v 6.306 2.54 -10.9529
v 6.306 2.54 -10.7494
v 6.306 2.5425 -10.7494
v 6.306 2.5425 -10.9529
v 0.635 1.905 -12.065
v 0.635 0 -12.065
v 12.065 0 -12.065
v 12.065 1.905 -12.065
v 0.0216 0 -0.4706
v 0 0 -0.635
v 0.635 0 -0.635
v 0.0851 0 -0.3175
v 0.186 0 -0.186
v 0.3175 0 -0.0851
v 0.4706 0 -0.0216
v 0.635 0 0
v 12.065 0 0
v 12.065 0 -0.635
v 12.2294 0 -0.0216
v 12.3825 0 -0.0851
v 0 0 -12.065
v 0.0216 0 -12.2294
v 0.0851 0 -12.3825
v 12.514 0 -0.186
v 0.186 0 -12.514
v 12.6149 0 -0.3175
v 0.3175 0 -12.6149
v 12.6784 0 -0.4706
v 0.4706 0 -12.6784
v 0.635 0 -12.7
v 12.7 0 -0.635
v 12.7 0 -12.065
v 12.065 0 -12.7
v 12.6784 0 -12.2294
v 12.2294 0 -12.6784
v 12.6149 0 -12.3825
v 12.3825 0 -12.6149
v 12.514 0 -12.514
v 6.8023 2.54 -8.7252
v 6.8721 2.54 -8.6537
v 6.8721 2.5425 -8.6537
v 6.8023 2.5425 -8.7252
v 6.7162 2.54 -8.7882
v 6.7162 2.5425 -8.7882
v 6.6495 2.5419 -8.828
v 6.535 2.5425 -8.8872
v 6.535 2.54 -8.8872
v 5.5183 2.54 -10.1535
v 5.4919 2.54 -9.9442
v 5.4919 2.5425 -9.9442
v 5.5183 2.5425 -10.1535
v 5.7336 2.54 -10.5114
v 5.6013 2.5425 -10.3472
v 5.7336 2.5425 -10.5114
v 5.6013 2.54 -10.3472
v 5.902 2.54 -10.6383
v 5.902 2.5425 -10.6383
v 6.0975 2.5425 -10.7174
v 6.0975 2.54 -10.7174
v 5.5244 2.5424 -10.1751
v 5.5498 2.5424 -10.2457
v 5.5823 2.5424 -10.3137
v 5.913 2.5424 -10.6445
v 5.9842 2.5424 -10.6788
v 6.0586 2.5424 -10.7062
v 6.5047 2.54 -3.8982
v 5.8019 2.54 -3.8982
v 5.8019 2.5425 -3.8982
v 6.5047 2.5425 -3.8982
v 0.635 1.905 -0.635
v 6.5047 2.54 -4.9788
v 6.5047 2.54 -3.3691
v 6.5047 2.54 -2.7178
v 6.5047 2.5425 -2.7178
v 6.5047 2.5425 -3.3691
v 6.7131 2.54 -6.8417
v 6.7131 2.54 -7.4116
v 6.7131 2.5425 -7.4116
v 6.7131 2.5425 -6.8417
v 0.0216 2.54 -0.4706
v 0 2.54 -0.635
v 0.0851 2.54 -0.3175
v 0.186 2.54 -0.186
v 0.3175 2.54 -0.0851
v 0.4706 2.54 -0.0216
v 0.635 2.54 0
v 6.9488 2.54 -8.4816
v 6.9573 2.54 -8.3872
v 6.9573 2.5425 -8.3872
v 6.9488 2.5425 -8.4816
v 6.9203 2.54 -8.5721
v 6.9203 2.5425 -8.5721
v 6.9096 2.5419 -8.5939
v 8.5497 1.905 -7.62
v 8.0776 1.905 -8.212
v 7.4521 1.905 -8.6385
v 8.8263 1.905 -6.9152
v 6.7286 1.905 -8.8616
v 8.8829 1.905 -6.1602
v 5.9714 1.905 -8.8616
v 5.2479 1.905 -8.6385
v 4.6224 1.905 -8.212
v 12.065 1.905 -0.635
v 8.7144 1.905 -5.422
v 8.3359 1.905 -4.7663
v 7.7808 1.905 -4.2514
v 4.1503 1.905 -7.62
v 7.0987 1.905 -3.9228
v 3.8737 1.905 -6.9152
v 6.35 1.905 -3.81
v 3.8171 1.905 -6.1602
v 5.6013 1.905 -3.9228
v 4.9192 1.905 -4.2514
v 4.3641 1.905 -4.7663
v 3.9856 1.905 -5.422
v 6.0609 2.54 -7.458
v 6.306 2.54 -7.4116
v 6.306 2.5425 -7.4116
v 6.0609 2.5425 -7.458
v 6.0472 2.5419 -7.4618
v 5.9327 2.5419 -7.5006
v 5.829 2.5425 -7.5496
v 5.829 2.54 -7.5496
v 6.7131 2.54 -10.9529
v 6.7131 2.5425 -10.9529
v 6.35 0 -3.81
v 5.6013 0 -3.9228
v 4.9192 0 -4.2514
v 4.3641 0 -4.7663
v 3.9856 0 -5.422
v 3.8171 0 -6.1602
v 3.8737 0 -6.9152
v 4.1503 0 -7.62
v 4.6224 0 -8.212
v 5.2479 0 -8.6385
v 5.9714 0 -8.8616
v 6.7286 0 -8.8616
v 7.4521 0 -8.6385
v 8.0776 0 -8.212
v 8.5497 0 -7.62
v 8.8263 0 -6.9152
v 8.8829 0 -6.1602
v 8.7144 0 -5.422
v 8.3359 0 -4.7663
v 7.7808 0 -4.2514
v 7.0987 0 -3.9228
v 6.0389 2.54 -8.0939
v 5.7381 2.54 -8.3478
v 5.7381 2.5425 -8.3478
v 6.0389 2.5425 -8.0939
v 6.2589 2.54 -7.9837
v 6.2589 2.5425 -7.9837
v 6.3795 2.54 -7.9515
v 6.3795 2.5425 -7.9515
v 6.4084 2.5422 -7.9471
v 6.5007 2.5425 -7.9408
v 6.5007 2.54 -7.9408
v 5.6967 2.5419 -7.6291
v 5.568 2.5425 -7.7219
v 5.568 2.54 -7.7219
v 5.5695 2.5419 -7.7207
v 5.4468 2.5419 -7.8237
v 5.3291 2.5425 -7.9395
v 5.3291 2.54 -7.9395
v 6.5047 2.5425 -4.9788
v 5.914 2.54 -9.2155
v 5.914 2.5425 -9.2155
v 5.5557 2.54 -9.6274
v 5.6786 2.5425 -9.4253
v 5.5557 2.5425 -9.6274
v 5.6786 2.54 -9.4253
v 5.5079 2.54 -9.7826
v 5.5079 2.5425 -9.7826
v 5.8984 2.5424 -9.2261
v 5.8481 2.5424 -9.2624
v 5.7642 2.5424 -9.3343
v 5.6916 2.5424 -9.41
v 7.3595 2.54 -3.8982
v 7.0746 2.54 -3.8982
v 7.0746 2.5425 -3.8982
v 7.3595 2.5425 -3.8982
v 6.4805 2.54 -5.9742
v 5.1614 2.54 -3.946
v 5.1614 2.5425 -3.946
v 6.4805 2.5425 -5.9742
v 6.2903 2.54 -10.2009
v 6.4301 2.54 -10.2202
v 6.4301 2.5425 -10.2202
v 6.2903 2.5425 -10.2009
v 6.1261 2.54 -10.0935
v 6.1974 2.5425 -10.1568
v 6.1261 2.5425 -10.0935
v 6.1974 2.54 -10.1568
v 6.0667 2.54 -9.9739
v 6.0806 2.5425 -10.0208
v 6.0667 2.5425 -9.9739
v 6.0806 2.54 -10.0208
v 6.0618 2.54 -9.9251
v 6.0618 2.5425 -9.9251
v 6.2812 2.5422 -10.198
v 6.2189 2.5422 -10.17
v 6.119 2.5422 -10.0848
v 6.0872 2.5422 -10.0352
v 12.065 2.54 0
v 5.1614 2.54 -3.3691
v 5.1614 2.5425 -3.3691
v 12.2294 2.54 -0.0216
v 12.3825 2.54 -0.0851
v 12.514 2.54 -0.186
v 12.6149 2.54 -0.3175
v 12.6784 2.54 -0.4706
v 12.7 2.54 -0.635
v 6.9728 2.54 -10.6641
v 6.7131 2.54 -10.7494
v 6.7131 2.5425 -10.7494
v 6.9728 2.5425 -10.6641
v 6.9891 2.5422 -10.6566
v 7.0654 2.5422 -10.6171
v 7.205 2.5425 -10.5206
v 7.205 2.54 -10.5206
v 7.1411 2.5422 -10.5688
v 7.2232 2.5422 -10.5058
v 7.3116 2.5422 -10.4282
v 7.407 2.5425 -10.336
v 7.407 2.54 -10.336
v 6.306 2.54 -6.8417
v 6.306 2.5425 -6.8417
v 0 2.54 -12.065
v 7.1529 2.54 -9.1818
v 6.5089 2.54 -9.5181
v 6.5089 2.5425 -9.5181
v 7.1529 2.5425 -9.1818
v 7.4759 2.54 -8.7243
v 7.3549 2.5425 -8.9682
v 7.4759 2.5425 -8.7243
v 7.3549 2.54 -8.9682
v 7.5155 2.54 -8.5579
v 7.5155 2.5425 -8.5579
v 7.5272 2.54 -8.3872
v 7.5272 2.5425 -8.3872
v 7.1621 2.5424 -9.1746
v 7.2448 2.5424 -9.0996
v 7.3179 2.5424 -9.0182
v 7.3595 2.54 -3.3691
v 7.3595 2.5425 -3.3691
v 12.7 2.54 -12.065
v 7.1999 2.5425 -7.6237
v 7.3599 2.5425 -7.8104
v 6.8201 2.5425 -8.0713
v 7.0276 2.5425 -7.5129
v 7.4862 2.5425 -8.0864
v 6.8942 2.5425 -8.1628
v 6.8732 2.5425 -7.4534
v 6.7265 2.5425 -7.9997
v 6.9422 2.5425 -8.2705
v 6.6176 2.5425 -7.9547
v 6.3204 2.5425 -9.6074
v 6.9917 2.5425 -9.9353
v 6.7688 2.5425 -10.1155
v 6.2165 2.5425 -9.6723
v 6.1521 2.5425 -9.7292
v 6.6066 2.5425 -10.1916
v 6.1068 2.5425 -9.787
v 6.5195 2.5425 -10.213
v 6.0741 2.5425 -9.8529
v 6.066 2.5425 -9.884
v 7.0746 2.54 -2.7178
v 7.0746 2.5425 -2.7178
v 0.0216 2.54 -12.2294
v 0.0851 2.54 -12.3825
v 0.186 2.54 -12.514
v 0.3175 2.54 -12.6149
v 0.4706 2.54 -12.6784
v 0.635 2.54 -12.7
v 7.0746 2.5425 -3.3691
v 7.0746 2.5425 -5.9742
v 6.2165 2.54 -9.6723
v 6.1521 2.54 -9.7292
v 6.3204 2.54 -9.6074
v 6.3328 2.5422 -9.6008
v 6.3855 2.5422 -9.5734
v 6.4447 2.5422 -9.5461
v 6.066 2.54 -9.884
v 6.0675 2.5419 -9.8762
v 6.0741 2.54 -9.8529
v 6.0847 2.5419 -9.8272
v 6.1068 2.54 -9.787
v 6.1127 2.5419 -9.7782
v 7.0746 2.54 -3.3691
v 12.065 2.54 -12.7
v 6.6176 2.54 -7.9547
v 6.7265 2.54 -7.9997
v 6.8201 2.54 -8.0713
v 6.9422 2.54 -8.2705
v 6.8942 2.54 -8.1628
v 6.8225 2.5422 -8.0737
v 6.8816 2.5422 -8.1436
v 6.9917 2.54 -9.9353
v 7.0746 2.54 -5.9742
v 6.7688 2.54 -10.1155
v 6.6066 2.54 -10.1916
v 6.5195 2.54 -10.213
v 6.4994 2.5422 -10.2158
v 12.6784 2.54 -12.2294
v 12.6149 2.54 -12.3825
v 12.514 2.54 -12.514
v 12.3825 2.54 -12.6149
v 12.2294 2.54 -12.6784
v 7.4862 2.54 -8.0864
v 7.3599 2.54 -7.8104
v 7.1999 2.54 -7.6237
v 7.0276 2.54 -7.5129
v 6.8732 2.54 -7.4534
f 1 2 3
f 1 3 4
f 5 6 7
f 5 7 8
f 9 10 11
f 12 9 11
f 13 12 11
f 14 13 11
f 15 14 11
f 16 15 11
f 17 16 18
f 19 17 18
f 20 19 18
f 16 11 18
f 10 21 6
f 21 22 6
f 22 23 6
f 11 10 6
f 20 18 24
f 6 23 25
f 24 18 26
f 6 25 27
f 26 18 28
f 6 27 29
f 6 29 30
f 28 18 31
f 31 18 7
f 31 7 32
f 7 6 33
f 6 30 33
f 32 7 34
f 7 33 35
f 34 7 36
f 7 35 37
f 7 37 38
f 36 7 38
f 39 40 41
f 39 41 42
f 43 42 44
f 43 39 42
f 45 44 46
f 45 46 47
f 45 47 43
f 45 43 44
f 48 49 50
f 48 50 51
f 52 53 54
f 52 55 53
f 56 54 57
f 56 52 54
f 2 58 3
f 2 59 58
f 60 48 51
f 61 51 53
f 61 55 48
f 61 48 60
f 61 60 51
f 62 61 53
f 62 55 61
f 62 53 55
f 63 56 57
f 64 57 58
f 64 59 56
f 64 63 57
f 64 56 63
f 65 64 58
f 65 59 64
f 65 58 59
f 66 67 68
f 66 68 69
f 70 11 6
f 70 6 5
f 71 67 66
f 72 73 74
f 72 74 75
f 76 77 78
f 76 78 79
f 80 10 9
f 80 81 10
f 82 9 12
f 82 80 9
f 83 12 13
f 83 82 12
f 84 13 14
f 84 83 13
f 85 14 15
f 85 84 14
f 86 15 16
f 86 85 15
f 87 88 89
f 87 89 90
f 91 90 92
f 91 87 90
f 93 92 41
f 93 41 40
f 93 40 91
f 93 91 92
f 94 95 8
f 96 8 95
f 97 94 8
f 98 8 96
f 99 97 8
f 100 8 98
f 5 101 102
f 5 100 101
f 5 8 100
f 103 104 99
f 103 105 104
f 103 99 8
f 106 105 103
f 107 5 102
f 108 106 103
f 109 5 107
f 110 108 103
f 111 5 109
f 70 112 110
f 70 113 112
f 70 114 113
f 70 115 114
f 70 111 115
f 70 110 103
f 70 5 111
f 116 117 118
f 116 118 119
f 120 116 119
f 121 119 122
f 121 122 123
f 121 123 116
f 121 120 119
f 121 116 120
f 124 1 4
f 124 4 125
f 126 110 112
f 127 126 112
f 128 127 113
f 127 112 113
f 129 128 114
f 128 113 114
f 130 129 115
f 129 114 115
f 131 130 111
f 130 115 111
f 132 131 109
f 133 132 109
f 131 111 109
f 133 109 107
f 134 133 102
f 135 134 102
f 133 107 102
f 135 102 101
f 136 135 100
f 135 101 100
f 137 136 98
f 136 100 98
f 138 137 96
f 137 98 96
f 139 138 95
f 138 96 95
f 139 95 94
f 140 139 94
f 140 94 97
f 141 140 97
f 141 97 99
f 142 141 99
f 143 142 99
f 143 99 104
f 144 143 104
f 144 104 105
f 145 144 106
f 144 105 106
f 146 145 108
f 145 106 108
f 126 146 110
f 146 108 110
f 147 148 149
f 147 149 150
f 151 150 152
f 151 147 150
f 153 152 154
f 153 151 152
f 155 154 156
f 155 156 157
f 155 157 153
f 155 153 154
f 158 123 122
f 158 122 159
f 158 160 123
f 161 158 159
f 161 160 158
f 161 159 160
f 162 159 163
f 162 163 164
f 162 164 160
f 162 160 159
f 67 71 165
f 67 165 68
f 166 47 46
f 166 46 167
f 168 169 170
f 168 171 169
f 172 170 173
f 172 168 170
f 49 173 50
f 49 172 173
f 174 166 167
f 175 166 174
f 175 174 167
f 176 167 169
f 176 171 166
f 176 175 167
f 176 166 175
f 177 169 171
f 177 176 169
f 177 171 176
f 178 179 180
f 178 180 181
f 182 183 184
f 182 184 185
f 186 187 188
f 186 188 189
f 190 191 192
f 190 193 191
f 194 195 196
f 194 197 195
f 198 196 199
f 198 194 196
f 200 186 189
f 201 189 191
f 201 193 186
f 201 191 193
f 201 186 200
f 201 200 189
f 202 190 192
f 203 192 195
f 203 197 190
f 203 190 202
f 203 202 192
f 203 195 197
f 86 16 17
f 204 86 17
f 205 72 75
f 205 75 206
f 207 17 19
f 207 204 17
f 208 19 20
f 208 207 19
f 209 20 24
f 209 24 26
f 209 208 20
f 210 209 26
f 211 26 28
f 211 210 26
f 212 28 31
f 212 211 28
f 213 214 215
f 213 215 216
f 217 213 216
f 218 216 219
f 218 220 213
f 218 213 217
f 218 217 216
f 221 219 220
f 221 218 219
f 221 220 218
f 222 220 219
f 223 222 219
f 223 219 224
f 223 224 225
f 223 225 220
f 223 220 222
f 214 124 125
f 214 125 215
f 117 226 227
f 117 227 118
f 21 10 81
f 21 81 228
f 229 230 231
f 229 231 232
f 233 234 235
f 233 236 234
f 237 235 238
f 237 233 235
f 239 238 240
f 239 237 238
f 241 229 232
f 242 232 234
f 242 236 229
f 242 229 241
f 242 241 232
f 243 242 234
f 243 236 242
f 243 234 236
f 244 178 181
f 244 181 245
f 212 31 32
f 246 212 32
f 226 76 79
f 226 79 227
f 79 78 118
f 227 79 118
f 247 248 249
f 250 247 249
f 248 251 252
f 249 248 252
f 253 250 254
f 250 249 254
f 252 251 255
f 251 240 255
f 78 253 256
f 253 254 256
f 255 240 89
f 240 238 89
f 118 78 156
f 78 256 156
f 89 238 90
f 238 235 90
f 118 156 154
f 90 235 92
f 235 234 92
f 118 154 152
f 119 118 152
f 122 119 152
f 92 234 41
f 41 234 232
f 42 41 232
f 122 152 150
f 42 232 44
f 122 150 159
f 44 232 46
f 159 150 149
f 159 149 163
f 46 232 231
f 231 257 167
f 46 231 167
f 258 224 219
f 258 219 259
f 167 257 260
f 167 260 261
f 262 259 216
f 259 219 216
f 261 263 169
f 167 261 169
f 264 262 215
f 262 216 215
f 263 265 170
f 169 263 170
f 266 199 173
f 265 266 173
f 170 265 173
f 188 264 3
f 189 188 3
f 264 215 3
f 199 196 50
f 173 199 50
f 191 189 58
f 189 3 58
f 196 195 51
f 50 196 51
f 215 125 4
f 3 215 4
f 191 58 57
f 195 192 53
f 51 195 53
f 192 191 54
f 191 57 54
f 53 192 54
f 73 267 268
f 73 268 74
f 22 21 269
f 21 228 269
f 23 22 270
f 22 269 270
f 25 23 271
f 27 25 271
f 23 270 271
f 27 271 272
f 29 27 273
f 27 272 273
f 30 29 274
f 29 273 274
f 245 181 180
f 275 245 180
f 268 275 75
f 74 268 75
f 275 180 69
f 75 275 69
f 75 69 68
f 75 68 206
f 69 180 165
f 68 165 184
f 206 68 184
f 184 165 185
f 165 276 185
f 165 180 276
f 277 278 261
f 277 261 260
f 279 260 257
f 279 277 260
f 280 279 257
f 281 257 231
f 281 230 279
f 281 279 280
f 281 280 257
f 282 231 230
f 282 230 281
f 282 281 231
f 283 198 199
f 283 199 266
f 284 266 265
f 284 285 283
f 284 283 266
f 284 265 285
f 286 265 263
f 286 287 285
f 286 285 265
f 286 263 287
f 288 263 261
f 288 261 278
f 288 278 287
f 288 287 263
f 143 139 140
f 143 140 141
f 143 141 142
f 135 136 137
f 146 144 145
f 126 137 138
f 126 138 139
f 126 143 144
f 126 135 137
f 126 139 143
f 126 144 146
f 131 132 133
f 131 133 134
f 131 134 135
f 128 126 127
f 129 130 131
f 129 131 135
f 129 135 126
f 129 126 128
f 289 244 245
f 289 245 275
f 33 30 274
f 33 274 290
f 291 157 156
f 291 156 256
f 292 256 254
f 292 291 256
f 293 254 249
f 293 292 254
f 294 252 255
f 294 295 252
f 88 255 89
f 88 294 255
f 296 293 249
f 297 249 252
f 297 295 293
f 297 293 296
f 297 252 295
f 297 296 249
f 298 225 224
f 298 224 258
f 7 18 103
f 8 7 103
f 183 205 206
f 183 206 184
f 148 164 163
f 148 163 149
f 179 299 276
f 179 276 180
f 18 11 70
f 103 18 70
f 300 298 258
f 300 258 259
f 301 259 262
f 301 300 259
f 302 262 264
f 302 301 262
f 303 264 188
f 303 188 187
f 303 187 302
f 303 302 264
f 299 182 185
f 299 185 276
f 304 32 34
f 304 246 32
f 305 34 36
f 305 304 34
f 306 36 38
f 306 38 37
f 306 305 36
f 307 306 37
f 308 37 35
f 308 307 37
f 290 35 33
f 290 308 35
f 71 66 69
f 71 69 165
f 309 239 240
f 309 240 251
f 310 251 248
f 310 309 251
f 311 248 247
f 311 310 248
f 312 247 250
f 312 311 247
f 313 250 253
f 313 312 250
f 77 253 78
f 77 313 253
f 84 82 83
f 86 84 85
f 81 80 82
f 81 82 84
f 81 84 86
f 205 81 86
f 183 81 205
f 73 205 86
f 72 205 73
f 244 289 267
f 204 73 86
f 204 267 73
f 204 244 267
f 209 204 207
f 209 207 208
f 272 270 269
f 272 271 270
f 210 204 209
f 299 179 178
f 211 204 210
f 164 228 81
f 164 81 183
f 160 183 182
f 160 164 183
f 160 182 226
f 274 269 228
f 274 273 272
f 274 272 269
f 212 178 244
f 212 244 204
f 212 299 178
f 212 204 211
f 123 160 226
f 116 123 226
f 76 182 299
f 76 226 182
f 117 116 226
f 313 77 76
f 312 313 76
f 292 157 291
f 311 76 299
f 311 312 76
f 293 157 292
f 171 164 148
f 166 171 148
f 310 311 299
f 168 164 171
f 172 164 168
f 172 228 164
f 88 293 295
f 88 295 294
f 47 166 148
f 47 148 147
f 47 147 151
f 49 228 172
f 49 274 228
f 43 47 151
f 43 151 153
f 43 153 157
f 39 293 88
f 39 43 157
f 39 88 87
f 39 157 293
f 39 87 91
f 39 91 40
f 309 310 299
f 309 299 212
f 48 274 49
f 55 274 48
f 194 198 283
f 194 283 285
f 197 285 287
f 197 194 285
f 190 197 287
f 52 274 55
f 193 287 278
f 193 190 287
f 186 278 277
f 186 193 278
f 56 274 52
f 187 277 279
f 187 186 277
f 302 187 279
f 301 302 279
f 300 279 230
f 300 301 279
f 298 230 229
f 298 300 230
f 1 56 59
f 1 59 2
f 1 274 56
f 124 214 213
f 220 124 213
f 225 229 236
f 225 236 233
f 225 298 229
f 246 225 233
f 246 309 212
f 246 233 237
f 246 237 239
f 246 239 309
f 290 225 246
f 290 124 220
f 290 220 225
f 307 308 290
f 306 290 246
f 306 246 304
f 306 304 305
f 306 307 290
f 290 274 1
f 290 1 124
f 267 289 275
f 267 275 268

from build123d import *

# Parameters (mm, degrees)
SKETCH1_W           = 12.7
SKETCH1_H           = 12.7
BOSS_EXTRUDE1_DEPTH = 2.54
FILLET1_R           = 0.635
SHELL1_START        = 0.635
SHELL1_OUTLINE_W    = 1.905
SHELL1_OUTLINE_H    = 11.43
SHELL1_DEPTH        = 11.43
SKETCH2_R           = 2.54
BOSS_EXTRUDE2_DEPTH = 1.905
BOSS_EXTRUDE4_DEPTH = 0.00254


# Read off the part's stored shape, not the designer's step: Shell1
with BuildPart() as part:
    # Sketch1 → Boss-Extrude1 (new body)
    with BuildSketch(Plane(origin=(0, 0, 0), x_dir=(1, 0, 0), z_dir=(0, 1, 0))):
        with Locations((6.35, 6.35)):
            Rectangle(SKETCH1_W, SKETCH1_H)
    extrude(amount=BOSS_EXTRUDE1_DEPTH)

    # Fillet1
    fillet1_edges = [part.edges().sort_by_distance(p)[0] for p in [
        (0, 1.27, -12.7),
        (12.7, 1.27, -12.7),
        (12.7, 1.27, 0),
        (0, 1.27, 0),
    ]]
    fillet(fillet1_edges, radius=FILLET1_R)

    # Shell1 outline → Shell1 (cut)
    with BuildSketch(Plane.YZ.offset(SHELL1_START)):
        with Locations((0.9525, -6.35)):
            Rectangle(SHELL1_OUTLINE_W, SHELL1_OUTLINE_H)
    extrude(amount=SHELL1_DEPTH, mode=Mode.SUBTRACT)

    # Sketch2 → Boss-Extrude2 (add)
    with BuildSketch(Plane(origin=(0, 1.905, 0), x_dir=(-1, 0, 0), z_dir=(0, -1, 0))):
        with Locations(Location((-6.35, 6.35, 0), (0, 0, 270))):
            Circle(SKETCH2_R)
    extrude(amount=BOSS_EXTRUDE2_DEPTH)

    # Sketch4 → Boss-Extrude4 (add)
    # profile 1 of 2: a face of its own
    with BuildSketch(Plane(origin=(0, 2.54, 0), x_dir=(1, 0, 0), z_dir=(0, 1, 0))):
        Polygon((6.480510817, 5.974210256), (7.074551282, 5.974210256), (7.074551282, 3.898248718), (7.359487179, 3.898248718), (7.359487179, 3.369082051), (7.074551282, 3.369082051), (7.074551282, 2.7178), (6.504679487, 2.7178), (6.504679487, 3.369082051), (5.161410256, 3.369082051), (5.161410256, 3.94595004), align=None)
        Polygon((6.504679487, 3.898248718), (6.504679487, 4.978842668), (5.801880008, 3.898248718), align=None, mode=Mode.SUBTRACT)
    # profile 2 of 2: a face of its own
    with BuildSketch(Plane(origin=(0, 2.54, 0), x_dir=(1, 0, 0), z_dir=(0, 1, 0))):
        with BuildLine():
            Line((7.406984976, 10.335998798), (6.991665465, 9.935307692))
            add(Edge.make_bspline(
                [(6.991665465, 9.935307692), (6.968220024, 9.957896469), (6.922854486, 10.001604413), (6.851968783, 10.059827369), (6.781357064, 10.108976166), (6.711092446, 10.149588351), (6.640799627, 10.181124743), (6.570421611, 10.203546558), (6.500157891, 10.217583932), (6.453231922, 10.219364448), (6.430061899, 10.22024359)],
                knots=[0, 0, 0, 0, 1.208861562, 2.33907556, 3.402820298, 4.400980881, 5.349191832, 6.258141005, 7.139945025, 8, 8, 8, 8], degree=3))
            add(Edge.make_bspline(
                [(6.430061899, 10.22024359), (6.403899471, 10.219170975), (6.353552661, 10.217106842), (6.281800477, 10.200625662), (6.218083395, 10.171963441), (6.162978001, 10.1335672), (6.118660061, 10.08737089), (6.085670238, 10.036873816), (6.065418702, 9.982146492), (6.063012994, 9.944162193), (6.061807692, 9.92513141)],
                knots=[0, 0, 0, 0, 1.198011544, 2.305445805, 3.348962256, 4.381113563, 5.363569282, 6.263566672, 7.130017225, 8, 8, 8, 8], degree=3))
            add(Edge.make_bspline(
                [(6.061807692, 9.92513141), (6.062942346, 9.908653977), (6.065271259, 9.874833543), (6.08412075, 9.82517461), (6.11232136, 9.775299071), (6.138383978, 9.745137076), (6.152122196, 9.729237981)],
                knots=[0, 0, 0, 0, 0.894516561, 1.836022459, 2.859316659, 4, 4, 4, 4], degree=3))
            add(Edge.make_bspline(
                [(6.152122196, 9.729237981), (6.160244287, 9.720816207), (6.177567552, 9.702853763), (6.208320254, 9.677594331), (6.244828496, 9.652473945), (6.286427709, 9.626009569), (6.334076496, 9.599858268), (6.386982478, 9.572031842), (6.4461068, 9.54521439), (6.487487603, 9.527340869), (6.508928085, 9.518080128)],
                knots=[0, 0, 0, 0, 0.672423156, 1.434182798, 2.28314655, 3.220082228, 4.268069212, 5.407712864, 6.656867891, 8, 8, 8, 8], degree=3))
            add(Edge.make_bspline(
                [(6.508928085, 9.518080128), (6.547123945, 9.501624615), (6.620529049, 9.470000279), (6.725949021, 9.423048644), (6.821745388, 9.377334714), (6.908362629, 9.333599875), (6.985371716, 9.291637921), (7.053234273, 9.251918102), (7.110960799, 9.212858211), (7.176358415, 9.165369813), (7.245332068, 9.101127918), (7.319697388, 9.019919388), (7.382052409, 8.929969443), (7.434496037, 8.833656469), (7.475970735, 8.730809102), (7.506000976, 8.621840061), (7.524224787, 8.506579255), (7.526188983, 8.42758935), (7.527192308, 8.387240785)],
                knots=[0, 0, 0, 0, 1.218452834, 2.341632252, 3.380669879, 4.327878116, 5.183951769, 5.949833714, 6.63028248, 7.225317665, 8.315786147, 9.384546881, 10.445973047, 11.51321668, 12.591625589, 13.68712373, 14.81856753, 16, 16, 16, 16], degree=3))
            add(Edge.make_bspline(
                [(7.527192308, 8.387240785), (7.525940527, 8.346682546), (7.523476092, 8.266833747), (7.504812176, 8.149311253), (7.472571433, 8.036846212), (7.429153295, 7.929917836), (7.374984908, 7.831254365), (7.31426383, 7.741649541), (7.245676289, 7.662999272), (7.181542739, 7.60682825), (7.126266053, 7.566022086), (7.079408572, 7.539362519), (7.029180829, 7.512893987), (6.974279808, 7.488884305), (6.915217227, 7.466725999), (6.851680833, 7.446436031), (6.784149797, 7.427141632), (6.737109705, 7.416846646), (6.713089744, 7.411589744)],
                knots=[0, 0, 0, 0, 1.398055402, 2.752413464, 4.089819795, 5.424146338, 6.722736095, 7.963569404, 9.149738937, 10.309787565, 10.896110825, 11.515406893, 12.166006826, 12.853269453, 13.579614796, 14.340134636, 15.152427224, 16, 16, 16, 16], degree=3))
            Line((6.713089744, 7.411589744), (6.713089744, 6.841717949))
            Line((6.713089744, 6.841717949), (6.306038462, 6.841717949))
            Line((6.306038462, 6.841717949), (6.306038462, 7.411589744))
            add(Edge.make_bspline(
                [(6.306038462, 7.411589744), (6.260932407, 7.417508865), (6.173627208, 7.428965643), (6.048973026, 7.459844727), (5.933431761, 7.497036363), (5.863209037, 7.532393856), (5.82902524, 7.549605569)],
                knots=[0, 0, 0, 0, 1.092056374, 2.113733945, 3.081782489, 4, 4, 4, 4], degree=3))
            add(Edge.make_bspline(
                [(5.82902524, 7.549605569), (5.784421922, 7.575319651), (5.694521215, 7.627147952), (5.567652028, 7.720202965), (5.443690251, 7.822749518), (5.367680431, 7.900192292), (5.329115385, 7.939484375)],
                knots=[0, 0, 0, 0, 0.970088211, 1.955271939, 2.962567826, 4, 4, 4, 4], degree=3))
            Line((5.329115385, 7.939484375), (5.73807472, 8.347807692))
            add(Edge.make_bspline(
                [(5.73807472, 8.347807692), (5.770276914, 8.315531916), (5.832553047, 8.253113482), (5.930208341, 8.170258717), (6.026937688, 8.099683859), (6.123133593, 8.042123916), (6.21841229, 7.996807875), (6.313137257, 7.964752249), (6.40716107, 7.944584507), (6.469824943, 7.942018876), (6.500659856, 7.94075641)],
                knots=[0, 0, 0, 0, 1.232518957, 2.38358023, 3.459285847, 4.467107529, 5.410929513, 6.306558082, 7.166710731, 8, 8, 8, 8], degree=3))
            add(Edge.make_bspline(
                [(6.500659856, 7.94075641), (6.530935033, 7.942287354), (6.590433781, 7.945296064), (6.676251693, 7.970961733), (6.754438188, 8.014226678), (6.824451013, 8.071818039), (6.882924302, 8.140474874), (6.926114925, 8.217254316), (6.952937787, 8.300259042), (6.955847074, 8.357998183), (6.957320513, 8.387240785)],
                knots=[0, 0, 0, 0, 1.025332292, 2.015049702, 3.006124463, 4.038216902, 5.073984904, 6.04617681, 7.010465453, 8, 8, 8, 8], degree=3))
            add(Edge.make_bspline(
                [(6.957320513, 8.387240785), (6.95646201, 8.411933563), (6.954785019, 8.460168152), (6.938095616, 8.529934505), (6.911632454, 8.595452748), (6.88533712, 8.634212047), (6.872094151, 8.653732171)],
                knots=[0, 0, 0, 0, 1.039339221, 2.030233321, 3.007977686, 4, 4, 4, 4], degree=3))
            add(Edge.make_bspline(
                [(6.872094151, 8.653732171), (6.85460202, 8.673362669), (6.816189839, 8.716470638), (6.740466296, 8.774265663), (6.645219094, 8.832335499), (6.573483267, 8.868013356), (6.535004808, 8.887150641)],
                knots=[0, 0, 0, 0, 0.762317005, 1.674024744, 2.752367564, 4, 4, 4, 4], degree=3))
            add(Edge.make_bspline(
                [(6.535004808, 8.887150641), (6.494507252, 8.906433078), (6.416597652, 8.943528822), (6.304602291, 8.997049085), (6.203256868, 9.048626278), (6.112557984, 9.097686427), (6.03159058, 9.142731993), (5.960729388, 9.184249859), (5.900795306, 9.224016823), (5.83450108, 9.27124253), (5.764387026, 9.331778858), (5.691098847, 9.407825341), (5.628662473, 9.487993783), (5.578981708, 9.573423124), (5.539805424, 9.661899474), (5.512543165, 9.753617062), (5.495251156, 9.847946671), (5.493048251, 9.91191248), (5.491935897, 9.944211939)],
                knots=[0, 0, 0, 0, 1.361149963, 2.618593809, 3.766618961, 4.811512794, 5.747589985, 6.578416214, 7.302870291, 7.929605856, 9.047509489, 10.107720061, 11.130736737, 12.122694611, 13.099282469, 14.059974503, 15.020386449, 16, 16, 16, 16], degree=3))
            add(Edge.make_bspline(
                [(5.491935897, 9.944211939), (5.492688489, 9.970752491), (5.494175897, 10.023206783), (5.505434517, 10.100481592), (5.522750824, 10.175049255), (5.548766759, 10.246263408), (5.581362042, 10.314610672), (5.620802687, 10.380506472), (5.6682686, 10.442870868), (5.722186861, 10.501770993), (5.78128424, 10.555933143), (5.844845686, 10.604219102), (5.912333412, 10.645653847), (5.983778264, 10.680011213), (6.058992906, 10.707624067), (6.137825565, 10.728257196), (6.220507462, 10.743532862), (6.277140501, 10.747424489), (6.306038462, 10.749410256)],
                knots=[0, 0, 0, 0, 1.004170626, 1.984625641, 2.949958411, 3.896703334, 4.847824684, 5.812490235, 6.7978582, 7.808834457, 8.831147227, 9.827755371, 10.825493475, 11.823199312, 12.823418834, 13.853042784, 14.904478961, 16, 16, 16, 16], degree=3))
            Line((6.306038462, 10.749410256), (6.306038462, 10.952935897))
            Line((6.306038462, 10.952935897), (6.713089744, 10.952935897))
            Line((6.713089744, 10.952935897), (6.713089744, 10.749410256))
            add(Edge.make_bspline(
                [(6.713089744, 10.749410256), (6.746474507, 10.740874198), (6.811234543, 10.724315883), (6.903809354, 10.69417972), (6.987944372, 10.65820288), (7.067293727, 10.617748164), (7.145681965, 10.56733025), (7.227556159, 10.503669804), (7.31605682, 10.425644759), (7.375483722, 10.367055847), (7.406984976, 10.335998798)],
                knots=[0, 0, 0, 0, 1.007023709, 1.953432773, 2.841901989, 3.678835315, 4.553739984, 5.561316369, 6.707292646, 8, 8, 8, 8], degree=3))
        make_face()
    extrude(amount=BOSS_EXTRUDE4_DEPTH)


solid = part.part
